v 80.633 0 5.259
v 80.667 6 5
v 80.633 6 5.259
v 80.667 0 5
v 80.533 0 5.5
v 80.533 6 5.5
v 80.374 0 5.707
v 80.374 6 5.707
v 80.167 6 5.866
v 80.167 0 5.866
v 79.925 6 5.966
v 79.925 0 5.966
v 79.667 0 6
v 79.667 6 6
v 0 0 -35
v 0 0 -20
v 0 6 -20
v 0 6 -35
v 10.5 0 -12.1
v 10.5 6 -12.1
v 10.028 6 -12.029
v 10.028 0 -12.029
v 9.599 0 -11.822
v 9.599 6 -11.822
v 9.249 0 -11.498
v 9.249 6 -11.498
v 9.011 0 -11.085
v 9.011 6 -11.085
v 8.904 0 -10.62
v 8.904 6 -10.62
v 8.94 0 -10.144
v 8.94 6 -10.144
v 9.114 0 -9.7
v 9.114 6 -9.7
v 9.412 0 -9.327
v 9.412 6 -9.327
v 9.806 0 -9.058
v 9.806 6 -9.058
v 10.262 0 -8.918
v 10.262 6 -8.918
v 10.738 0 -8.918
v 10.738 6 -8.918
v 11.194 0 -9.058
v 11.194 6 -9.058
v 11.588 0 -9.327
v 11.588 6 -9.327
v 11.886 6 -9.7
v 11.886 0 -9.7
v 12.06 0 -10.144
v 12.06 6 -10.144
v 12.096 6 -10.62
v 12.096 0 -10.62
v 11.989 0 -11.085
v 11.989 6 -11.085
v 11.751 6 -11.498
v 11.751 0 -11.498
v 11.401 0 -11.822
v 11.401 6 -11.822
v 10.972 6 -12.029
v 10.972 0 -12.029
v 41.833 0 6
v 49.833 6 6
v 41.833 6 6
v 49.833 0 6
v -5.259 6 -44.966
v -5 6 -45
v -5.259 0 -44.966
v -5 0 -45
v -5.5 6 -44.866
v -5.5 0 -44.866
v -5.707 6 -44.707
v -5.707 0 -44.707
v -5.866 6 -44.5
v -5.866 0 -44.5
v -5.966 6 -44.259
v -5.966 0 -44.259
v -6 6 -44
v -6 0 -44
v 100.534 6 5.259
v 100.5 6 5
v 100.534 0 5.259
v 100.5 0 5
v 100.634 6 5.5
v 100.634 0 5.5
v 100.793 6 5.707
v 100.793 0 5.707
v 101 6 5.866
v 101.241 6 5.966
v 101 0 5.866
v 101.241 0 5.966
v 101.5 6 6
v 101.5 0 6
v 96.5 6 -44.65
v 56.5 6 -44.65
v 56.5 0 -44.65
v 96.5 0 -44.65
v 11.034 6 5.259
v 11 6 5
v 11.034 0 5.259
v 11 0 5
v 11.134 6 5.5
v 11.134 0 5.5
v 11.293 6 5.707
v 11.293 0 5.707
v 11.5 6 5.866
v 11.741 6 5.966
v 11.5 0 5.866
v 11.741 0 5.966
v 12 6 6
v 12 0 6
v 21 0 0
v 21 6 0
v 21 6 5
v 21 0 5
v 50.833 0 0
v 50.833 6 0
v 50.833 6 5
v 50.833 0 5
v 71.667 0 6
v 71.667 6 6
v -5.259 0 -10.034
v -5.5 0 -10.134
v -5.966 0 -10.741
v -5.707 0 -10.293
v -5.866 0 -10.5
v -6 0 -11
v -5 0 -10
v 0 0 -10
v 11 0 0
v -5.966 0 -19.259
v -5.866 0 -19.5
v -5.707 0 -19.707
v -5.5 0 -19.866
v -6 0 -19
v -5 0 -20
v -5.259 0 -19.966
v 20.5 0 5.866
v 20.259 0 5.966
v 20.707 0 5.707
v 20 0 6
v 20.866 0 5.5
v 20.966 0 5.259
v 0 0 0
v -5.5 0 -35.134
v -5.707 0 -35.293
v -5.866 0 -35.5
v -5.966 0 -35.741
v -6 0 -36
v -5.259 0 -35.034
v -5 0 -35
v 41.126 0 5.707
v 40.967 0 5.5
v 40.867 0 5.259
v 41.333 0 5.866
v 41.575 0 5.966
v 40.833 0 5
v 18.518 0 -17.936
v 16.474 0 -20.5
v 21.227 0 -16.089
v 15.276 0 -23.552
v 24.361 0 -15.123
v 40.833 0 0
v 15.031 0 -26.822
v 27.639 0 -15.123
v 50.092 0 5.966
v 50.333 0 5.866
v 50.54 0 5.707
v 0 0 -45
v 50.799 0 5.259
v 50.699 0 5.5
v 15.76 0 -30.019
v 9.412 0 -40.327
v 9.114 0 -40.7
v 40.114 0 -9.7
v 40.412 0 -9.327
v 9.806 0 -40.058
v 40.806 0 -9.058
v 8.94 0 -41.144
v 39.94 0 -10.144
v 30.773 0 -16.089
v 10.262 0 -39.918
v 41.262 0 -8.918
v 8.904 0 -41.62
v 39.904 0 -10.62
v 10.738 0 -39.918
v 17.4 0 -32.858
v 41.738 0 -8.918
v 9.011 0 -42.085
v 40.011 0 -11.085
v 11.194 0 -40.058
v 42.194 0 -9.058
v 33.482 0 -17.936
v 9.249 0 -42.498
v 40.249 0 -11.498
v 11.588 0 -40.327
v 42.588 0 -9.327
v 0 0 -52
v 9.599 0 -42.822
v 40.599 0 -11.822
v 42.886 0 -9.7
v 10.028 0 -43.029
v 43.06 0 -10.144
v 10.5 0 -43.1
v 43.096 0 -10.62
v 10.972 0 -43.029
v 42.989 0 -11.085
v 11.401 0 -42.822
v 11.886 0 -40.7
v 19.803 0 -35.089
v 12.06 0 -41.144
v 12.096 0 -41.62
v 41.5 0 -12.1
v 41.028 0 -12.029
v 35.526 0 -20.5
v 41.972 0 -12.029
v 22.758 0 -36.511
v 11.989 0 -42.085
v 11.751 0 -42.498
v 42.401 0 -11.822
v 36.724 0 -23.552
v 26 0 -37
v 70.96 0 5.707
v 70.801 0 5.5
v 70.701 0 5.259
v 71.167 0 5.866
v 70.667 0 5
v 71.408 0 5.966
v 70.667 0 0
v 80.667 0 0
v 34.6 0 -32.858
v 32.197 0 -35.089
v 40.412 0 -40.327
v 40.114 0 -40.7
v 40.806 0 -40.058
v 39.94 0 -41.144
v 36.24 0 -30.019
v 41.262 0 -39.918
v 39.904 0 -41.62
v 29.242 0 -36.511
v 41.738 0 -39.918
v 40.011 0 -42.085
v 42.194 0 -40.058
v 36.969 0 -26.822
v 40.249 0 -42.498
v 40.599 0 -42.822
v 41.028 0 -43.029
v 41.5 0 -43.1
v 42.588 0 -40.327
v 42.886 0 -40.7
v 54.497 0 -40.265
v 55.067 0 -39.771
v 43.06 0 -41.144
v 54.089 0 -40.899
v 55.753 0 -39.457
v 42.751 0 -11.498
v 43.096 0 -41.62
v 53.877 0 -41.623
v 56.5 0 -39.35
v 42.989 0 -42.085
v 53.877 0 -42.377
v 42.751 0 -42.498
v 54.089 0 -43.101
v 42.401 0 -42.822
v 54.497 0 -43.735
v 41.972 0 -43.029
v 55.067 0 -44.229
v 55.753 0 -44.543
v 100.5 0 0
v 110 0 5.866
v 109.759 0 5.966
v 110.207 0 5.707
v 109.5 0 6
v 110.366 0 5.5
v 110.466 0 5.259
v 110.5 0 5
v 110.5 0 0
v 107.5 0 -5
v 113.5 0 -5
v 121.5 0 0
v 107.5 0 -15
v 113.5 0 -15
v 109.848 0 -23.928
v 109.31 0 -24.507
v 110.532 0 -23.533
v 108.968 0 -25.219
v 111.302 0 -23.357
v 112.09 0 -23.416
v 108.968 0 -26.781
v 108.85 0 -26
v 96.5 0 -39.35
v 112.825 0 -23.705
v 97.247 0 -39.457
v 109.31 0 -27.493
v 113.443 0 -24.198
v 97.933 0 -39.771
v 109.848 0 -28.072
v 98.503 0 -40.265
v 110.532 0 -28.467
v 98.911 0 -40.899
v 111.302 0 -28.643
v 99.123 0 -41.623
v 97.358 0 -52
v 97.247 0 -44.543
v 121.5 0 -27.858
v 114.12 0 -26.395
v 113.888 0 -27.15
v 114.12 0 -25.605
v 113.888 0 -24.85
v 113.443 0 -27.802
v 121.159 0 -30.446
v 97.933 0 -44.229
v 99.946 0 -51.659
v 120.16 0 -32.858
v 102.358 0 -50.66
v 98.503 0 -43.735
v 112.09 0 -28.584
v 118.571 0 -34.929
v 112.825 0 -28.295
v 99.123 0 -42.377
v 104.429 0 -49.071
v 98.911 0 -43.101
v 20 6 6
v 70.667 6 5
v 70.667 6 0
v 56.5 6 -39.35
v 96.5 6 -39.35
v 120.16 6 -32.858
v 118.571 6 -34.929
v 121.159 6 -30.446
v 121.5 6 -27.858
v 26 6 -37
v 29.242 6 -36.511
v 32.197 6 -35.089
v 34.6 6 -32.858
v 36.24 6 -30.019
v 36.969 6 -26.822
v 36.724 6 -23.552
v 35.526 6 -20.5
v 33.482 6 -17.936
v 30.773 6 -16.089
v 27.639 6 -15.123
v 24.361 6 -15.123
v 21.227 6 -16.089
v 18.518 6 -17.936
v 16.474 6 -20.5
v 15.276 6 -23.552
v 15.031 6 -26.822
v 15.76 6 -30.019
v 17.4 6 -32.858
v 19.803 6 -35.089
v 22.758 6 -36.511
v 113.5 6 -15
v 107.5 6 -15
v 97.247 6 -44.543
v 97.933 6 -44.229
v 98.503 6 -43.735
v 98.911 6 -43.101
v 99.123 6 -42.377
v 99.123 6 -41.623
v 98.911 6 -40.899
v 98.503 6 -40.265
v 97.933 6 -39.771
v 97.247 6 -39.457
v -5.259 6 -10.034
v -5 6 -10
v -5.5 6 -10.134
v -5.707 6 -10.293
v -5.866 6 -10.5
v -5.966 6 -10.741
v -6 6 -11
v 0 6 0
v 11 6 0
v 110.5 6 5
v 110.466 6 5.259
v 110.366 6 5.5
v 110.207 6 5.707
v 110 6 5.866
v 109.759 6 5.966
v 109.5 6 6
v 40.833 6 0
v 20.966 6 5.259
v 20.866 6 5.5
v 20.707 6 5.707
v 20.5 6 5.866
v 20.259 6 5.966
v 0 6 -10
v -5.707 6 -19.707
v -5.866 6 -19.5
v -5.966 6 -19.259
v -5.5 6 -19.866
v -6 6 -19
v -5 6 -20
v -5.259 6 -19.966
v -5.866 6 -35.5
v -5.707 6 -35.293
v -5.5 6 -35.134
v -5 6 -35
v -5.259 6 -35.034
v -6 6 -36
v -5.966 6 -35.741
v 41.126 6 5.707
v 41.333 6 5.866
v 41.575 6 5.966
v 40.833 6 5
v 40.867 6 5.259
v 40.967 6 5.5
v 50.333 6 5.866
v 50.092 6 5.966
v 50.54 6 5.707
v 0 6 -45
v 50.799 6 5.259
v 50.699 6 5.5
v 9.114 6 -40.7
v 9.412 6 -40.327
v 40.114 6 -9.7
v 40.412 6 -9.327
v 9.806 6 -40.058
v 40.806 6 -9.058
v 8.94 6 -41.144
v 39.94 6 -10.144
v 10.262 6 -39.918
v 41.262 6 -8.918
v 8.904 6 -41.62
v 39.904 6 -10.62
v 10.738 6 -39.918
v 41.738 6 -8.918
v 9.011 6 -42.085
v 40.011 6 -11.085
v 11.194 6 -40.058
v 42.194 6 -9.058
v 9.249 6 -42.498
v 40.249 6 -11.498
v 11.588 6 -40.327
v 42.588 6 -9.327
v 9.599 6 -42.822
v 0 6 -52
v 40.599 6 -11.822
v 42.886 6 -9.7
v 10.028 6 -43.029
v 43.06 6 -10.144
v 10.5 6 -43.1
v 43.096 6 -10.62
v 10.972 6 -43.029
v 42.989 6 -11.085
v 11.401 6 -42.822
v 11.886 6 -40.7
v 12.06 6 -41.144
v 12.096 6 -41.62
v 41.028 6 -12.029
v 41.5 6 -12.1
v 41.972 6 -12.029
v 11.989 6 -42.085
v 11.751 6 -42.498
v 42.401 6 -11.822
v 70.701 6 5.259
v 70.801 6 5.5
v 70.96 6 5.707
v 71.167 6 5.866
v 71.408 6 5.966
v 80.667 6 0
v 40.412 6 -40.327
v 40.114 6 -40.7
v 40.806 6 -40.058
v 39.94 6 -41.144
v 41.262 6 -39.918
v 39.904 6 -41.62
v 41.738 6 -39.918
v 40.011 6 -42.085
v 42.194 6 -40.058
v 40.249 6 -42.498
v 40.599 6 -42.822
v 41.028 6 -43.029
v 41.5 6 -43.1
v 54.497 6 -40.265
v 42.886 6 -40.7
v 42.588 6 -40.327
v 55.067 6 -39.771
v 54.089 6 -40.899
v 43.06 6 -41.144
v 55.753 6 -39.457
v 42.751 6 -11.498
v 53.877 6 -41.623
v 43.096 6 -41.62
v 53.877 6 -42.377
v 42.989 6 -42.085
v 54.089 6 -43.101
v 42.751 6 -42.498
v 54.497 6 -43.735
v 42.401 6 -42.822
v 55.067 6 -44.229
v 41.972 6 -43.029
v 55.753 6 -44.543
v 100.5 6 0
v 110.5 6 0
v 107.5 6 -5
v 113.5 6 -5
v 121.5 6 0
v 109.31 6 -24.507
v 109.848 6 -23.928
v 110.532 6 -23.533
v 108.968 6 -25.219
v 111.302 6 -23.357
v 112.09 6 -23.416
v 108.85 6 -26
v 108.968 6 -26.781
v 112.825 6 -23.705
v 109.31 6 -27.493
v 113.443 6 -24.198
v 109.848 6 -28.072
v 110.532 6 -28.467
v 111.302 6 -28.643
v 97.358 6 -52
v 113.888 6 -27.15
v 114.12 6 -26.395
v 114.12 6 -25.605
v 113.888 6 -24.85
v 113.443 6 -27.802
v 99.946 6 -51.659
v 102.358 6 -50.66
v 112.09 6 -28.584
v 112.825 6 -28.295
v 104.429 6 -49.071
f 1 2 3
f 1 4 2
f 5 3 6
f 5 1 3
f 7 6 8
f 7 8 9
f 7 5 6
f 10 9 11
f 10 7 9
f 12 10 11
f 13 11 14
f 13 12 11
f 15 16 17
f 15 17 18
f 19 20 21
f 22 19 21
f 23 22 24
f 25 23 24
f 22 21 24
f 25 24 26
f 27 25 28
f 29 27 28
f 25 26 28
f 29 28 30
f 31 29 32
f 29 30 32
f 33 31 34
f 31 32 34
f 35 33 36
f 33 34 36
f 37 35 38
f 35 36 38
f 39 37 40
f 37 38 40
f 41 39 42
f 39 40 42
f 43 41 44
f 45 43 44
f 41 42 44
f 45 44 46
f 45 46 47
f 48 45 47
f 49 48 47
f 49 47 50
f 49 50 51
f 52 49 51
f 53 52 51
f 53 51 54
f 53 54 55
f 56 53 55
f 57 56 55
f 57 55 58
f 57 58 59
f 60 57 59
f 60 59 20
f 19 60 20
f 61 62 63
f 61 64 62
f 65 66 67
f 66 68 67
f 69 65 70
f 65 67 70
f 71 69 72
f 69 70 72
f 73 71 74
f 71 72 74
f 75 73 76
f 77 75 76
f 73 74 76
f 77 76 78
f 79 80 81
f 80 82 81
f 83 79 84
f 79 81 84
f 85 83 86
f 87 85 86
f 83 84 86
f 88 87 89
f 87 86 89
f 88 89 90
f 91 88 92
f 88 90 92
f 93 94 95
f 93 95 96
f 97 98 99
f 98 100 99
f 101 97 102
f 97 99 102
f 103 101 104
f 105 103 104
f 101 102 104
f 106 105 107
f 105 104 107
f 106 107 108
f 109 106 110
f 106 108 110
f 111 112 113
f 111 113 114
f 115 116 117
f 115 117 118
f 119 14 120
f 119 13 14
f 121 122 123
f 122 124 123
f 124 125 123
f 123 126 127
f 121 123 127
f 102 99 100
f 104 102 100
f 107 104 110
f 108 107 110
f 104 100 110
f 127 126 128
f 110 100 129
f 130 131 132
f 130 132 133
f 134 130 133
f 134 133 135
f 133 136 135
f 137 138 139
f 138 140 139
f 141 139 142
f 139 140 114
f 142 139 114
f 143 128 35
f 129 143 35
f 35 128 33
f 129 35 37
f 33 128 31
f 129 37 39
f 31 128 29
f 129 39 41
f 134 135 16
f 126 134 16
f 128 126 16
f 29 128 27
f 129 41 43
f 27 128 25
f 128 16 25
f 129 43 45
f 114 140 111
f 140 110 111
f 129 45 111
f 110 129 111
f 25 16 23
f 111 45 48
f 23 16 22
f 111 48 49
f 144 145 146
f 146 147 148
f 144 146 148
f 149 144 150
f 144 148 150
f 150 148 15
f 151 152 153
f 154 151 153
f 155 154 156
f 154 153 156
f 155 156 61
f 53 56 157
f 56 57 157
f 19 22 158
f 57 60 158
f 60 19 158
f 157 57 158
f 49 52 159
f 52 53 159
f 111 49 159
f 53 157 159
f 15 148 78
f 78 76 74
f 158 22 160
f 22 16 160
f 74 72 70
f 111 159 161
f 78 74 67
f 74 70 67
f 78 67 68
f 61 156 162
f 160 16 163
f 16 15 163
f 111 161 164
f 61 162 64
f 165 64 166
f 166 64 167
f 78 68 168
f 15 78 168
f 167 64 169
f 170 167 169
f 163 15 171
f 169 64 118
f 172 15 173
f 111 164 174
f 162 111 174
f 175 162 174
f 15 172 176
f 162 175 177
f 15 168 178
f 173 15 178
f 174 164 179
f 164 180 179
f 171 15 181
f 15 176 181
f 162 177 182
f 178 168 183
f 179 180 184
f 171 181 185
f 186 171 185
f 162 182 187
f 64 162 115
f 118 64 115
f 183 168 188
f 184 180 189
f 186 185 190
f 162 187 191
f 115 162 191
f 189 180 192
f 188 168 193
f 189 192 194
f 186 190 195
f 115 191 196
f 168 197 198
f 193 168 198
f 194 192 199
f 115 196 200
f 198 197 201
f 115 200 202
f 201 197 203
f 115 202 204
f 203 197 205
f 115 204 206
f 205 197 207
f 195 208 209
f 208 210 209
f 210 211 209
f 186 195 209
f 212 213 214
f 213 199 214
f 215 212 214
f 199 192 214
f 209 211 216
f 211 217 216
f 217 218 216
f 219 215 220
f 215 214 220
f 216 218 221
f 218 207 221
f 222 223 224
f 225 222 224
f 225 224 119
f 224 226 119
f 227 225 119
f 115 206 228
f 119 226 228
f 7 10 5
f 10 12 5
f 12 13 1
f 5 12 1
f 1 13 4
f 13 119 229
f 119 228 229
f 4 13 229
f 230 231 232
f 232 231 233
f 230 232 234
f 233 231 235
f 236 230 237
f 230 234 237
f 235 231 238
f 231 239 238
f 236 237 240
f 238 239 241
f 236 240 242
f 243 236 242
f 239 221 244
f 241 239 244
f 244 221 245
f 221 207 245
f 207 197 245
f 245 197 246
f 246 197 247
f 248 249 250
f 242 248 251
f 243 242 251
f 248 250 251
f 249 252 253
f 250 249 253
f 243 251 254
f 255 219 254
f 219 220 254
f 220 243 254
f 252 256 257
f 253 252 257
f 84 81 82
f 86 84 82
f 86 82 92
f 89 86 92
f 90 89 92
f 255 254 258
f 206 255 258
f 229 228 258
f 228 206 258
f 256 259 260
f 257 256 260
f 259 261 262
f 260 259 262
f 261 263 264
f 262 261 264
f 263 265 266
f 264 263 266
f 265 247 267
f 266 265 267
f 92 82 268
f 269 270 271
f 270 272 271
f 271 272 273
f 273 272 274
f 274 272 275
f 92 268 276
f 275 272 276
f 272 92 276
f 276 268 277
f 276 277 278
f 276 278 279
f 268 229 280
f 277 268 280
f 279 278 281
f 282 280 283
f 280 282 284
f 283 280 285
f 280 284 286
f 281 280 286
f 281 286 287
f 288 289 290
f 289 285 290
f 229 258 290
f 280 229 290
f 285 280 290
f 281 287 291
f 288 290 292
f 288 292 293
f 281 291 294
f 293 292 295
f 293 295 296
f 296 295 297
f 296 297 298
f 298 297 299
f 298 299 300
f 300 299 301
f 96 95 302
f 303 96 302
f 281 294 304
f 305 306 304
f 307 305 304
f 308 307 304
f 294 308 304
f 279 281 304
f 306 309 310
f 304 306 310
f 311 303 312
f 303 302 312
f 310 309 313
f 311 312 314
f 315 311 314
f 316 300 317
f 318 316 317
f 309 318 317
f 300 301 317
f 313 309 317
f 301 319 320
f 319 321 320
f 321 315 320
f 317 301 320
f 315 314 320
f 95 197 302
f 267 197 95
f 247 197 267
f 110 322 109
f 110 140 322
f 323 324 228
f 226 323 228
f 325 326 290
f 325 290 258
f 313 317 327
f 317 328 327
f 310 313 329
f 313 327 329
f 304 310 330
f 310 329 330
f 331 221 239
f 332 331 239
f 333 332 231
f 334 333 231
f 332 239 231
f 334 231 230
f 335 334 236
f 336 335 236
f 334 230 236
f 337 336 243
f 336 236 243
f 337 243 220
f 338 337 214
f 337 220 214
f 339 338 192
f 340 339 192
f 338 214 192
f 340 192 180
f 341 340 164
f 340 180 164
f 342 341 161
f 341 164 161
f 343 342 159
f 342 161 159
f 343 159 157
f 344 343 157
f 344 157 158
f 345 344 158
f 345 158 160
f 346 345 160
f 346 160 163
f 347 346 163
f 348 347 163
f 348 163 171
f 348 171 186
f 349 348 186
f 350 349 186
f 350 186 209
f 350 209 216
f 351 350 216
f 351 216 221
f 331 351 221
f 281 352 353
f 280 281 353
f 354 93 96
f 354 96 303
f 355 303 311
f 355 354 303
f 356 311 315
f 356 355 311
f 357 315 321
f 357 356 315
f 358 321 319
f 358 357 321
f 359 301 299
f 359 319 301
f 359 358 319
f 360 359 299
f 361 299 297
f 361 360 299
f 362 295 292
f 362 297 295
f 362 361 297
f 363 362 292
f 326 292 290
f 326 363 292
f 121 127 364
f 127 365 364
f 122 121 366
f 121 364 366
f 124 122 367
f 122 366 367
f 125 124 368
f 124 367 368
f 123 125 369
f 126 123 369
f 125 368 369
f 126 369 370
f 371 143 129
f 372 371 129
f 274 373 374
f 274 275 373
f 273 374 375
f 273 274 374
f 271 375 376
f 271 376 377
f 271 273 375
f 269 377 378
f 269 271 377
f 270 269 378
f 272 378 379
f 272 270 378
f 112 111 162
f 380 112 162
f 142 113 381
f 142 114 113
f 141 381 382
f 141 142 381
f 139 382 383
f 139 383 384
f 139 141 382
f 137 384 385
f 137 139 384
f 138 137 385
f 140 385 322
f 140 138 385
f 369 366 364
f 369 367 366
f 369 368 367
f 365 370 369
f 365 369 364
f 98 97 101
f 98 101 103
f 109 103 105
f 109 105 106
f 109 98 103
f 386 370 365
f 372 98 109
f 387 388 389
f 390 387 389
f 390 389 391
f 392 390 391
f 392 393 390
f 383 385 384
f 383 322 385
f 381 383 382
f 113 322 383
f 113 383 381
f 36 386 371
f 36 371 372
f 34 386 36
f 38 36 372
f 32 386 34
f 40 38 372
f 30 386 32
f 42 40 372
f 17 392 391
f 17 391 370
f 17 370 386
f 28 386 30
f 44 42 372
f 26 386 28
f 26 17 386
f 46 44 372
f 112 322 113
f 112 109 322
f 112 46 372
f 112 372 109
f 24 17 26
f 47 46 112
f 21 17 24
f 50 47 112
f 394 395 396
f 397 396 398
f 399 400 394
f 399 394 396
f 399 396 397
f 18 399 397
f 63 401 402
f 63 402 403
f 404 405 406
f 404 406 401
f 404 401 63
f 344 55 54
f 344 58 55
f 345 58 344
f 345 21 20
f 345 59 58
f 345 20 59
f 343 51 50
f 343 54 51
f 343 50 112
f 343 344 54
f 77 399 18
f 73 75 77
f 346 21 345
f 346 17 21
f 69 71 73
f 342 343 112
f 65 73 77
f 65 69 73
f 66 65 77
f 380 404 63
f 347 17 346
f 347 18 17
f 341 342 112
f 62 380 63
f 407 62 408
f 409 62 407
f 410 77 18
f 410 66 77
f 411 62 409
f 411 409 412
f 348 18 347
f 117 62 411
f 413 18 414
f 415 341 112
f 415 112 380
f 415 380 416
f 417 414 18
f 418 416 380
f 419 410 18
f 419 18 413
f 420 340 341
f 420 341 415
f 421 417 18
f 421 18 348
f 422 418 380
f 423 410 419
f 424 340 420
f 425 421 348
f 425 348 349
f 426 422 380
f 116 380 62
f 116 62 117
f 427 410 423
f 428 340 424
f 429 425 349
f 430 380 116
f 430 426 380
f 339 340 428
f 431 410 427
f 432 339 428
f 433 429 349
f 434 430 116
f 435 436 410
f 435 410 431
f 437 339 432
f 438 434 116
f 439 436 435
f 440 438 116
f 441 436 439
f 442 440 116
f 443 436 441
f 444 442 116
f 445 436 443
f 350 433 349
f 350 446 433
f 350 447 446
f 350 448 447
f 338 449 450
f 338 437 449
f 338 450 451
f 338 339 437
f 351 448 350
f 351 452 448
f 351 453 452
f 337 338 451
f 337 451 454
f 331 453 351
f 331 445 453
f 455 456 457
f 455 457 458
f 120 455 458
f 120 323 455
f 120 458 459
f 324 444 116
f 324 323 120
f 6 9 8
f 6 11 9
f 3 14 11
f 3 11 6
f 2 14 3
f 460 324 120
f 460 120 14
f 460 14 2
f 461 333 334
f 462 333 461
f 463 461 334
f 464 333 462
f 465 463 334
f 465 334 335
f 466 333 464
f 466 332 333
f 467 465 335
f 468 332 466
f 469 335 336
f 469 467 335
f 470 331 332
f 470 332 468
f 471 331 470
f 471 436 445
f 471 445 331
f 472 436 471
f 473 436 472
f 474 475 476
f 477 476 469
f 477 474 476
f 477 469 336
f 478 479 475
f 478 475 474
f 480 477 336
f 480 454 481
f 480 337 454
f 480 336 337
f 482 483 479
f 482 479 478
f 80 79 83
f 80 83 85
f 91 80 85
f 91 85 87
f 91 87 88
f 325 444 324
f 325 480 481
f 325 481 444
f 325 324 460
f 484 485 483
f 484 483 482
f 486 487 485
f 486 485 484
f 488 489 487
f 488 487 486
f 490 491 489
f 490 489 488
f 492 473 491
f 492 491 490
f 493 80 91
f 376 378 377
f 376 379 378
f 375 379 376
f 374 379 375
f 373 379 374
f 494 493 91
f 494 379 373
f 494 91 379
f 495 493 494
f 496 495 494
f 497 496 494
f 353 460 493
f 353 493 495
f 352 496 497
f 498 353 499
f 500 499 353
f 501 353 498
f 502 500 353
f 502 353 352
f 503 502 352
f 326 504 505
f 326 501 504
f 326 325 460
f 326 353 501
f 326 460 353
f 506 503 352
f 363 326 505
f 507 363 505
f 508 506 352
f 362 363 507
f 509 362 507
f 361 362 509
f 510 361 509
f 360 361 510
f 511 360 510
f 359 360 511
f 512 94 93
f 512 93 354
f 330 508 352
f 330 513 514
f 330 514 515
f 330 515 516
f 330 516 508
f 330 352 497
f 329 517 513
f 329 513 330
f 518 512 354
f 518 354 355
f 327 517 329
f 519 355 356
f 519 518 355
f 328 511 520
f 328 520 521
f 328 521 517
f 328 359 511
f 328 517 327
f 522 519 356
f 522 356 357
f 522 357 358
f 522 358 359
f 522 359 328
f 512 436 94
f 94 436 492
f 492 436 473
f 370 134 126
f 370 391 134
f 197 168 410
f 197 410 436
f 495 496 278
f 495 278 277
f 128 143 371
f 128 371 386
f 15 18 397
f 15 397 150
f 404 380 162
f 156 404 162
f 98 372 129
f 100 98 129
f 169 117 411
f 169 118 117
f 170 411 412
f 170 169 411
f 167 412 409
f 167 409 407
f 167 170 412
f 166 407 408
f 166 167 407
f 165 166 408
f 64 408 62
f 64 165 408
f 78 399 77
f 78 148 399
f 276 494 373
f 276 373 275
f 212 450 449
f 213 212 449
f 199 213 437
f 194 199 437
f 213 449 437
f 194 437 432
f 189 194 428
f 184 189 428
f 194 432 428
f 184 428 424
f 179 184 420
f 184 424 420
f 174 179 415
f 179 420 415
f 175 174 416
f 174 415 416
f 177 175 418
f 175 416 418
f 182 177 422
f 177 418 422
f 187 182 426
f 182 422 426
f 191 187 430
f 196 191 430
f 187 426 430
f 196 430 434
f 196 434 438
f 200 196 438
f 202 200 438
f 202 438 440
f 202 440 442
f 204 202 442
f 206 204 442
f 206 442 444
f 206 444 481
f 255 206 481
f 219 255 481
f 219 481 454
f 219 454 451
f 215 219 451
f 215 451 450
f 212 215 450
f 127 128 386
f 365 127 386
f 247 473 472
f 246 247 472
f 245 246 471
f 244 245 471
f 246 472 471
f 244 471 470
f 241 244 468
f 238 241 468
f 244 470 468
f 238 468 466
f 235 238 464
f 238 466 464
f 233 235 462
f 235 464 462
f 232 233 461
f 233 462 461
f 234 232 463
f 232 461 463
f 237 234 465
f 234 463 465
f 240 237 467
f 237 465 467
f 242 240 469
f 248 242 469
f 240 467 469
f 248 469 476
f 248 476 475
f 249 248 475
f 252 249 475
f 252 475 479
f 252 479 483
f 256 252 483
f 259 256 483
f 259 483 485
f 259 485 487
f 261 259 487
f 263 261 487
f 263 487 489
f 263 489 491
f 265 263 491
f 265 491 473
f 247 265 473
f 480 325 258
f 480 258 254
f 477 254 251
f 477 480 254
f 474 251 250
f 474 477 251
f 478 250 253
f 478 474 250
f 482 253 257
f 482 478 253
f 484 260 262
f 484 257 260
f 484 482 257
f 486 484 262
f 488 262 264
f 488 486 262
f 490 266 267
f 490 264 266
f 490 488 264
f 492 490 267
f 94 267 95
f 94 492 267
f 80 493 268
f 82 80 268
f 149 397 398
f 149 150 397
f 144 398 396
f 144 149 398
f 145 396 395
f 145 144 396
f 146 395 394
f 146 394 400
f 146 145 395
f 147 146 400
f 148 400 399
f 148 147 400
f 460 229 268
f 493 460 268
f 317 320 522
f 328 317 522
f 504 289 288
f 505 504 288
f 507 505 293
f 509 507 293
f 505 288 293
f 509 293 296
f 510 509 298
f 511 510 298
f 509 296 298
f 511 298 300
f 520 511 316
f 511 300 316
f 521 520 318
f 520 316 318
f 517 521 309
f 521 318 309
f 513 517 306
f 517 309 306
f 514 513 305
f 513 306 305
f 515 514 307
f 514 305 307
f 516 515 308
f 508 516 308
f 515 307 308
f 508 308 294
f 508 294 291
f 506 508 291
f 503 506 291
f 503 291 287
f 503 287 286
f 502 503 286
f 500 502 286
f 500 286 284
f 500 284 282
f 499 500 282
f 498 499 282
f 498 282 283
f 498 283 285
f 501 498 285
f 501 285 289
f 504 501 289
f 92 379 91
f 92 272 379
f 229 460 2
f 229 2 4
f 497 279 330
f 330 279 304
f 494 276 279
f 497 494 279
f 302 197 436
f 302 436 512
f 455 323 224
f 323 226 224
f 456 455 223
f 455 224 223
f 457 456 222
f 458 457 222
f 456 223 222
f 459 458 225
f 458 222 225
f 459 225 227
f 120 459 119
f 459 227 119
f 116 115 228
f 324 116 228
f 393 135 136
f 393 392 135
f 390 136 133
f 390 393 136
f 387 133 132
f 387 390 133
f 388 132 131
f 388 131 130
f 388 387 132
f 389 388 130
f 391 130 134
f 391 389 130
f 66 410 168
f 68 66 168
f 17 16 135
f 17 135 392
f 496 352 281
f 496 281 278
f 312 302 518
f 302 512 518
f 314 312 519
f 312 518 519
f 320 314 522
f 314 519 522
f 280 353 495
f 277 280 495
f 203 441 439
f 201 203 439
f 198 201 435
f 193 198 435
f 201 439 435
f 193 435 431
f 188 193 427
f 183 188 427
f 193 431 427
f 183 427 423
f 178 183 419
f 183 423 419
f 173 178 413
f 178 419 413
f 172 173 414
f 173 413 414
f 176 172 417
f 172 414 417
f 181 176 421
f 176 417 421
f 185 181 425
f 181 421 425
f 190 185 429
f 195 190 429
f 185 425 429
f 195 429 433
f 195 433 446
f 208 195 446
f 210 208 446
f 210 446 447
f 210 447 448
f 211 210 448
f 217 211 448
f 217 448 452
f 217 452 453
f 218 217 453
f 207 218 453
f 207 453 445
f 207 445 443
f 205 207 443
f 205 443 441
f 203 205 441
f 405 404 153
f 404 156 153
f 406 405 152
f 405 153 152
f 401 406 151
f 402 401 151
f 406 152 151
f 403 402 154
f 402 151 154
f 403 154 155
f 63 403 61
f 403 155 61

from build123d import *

# Parameters (mm, degrees)
SKETCH1_W               = 121.5
SKETCH1_H               = 52
BOSS_EXTRUDE1_DEPTH     = 6
CHAMFER1_SIZE           = 20
M5_CLEARANCE_HOLE1_D    = 5.3
CUT_EXTRUDE4_DEPTH      = 7
M3_CLEARANCE_HOLE1_D    = 3.2
SKETCH6_R               = 11
CUT_EXTRUDE3_DEPTH      = 7
SKETCH234_W             = 10
SKETCH234_H             = 6
BOSS_EXTRUDE234_DEPTH   = 6
FILLET134_R             = 1
SKETCH2341_W            = 10
SKETCH2341_H            = 6
BOSS_EXTRUDE2341_DEPTH  = 6
FILLET1341_R            = 1
SKETCH2342_W            = 10
SKETCH2342_H            = 6
BOSS_EXTRUDE2342_DEPTH  = 6
FILLET1342_R            = 1
SKETCH2343_W            = 10
SKETCH2343_H            = 6
BOSS_EXTRUDE2343_DEPTH  = 6
FILLET1343_R            = 1
SKETCH2345_W            = 10
SKETCH2345_H            = 6
BOSS_EXTRUDE2345_DEPTH  = 6
FILLET1345_R            = 1
SKETCH2346_W            = 10
SKETCH2346_H            = 6
BOSS_EXTRUDE2346_DEPTH  = 6
FILLET1346_R            = 1
FILLET1347_R            = 10
SKETCH62_W              = 10
SKETCH62_H              = 6
CUT_EXTRUDE1_DEPTH      = 4
CUT_EXTRUDE1_DEPTH_BACK = 4


with BuildPart() as part:
    # Sketch1 → Boss-Extrude1 (new body)
    with BuildSketch(Plane(origin=(0, 0, 0), x_dir=(1, 0, 0), z_dir=(0, 1, 0))):
        with Locations((60.75, 26)):
            Rectangle(SKETCH1_W, SKETCH1_H)
    extrude(amount=BOSS_EXTRUDE1_DEPTH)

    # Chamfer1
    chamfer1_edges = [part.edges().sort_by_distance(p)[0] for p in [
        (121.5, 3, -52),
    ]]
    chamfer(chamfer1_edges, length=CHAMFER1_SIZE)

    # M5 Clearance Hole1 (through all)
    with Locations(Plane(origin=(0, 6, 0), x_dir=(1, 0, 0), z_dir=(0, 1, 0))):
        with Locations((111.5, 26)):
            Hole(M5_CLEARANCE_HOLE1_D / 2)

    # Sketch7 → Cut-Extrude4 (cut, through all)
    with BuildSketch(Plane(origin=(0, 6, 0), x_dir=(1, 0, 0), z_dir=(0, 1, 0))):
        with BuildLine():
            Line((56.5, 44.65), (96.5, 44.65))
            ThreePointArc((96.5, 44.65), (99.15, 42), (96.5, 39.35))
            Line((96.5, 39.35), (56.5, 39.35))
            ThreePointArc((56.5, 39.35), (53.85, 42), (56.5, 44.65))
        make_face()
    extrude(amount=-CUT_EXTRUDE4_DEPTH, mode=Mode.SUBTRACT)

    # M3 Clearance Hole1 (through all)
    with Locations(Plane(origin=(26, 0, -26), x_dir=(0, 0, 1), z_dir=(0, -1, 0))):
        with Locations((15.5, -15.5), (-15.5, -15.5), (-15.5, 15.5), (15.5, 15.5)):
            Hole(M3_CLEARANCE_HOLE1_D / 2)

    # Sketch6 → Cut-Extrude3 (cut, through all)
    with BuildSketch(Plane(origin=(26, 0, -26), x_dir=(0, 0, -1), z_dir=(0, -1, 0))):
        Circle(SKETCH6_R)
    extrude(amount=-CUT_EXTRUDE3_DEPTH, mode=Mode.SUBTRACT)

    # Sketch234 → Boss-Extrude234 (add)
    with BuildSketch(Plane(origin=(16.767778608, 6, 0), x_dir=(-1, 0, 0), z_dir=(0, 0, 1))):
        with Locations((0.767778608, 3)):
            Rectangle(SKETCH234_W, SKETCH234_H)
    extrude(amount=BOSS_EXTRUDE234_DEPTH)

    # Fillet134
    fillet134_edges = [part.edges().sort_by_distance(p)[0] for p in [
        (21, 3, 6),
        (11, 3, 6),
    ]]
    fillet(fillet134_edges, radius=FILLET134_R)

    # Sketch2341 → Boss-Extrude2341 (add)
    with BuildSketch(Plane(origin=(46.601111941, 6, 0), x_dir=(-1, 0, 0), z_dir=(0, 0, 1))):
        with Locations((0.767778608, 3)):
            Rectangle(SKETCH2341_W, SKETCH2341_H)
    extrude(amount=BOSS_EXTRUDE2341_DEPTH)

    # Fillet1341
    fillet1341_edges = [part.edges().sort_by_distance(p)[0] for p in [
        (40.833333333, 3, 6),
        (50.833333333, 3, 6),
    ]]
    fillet(fillet1341_edges, radius=FILLET1341_R)

    # Sketch2342 → Boss-Extrude2342 (add)
    with BuildSketch(Plane(origin=(76.434445274, 6, 0), x_dir=(-1, 0, 0), z_dir=(0, 0, 1))):
        with Locations((0.767778608, 3)):
            Rectangle(SKETCH2342_W, SKETCH2342_H)
    extrude(amount=BOSS_EXTRUDE2342_DEPTH)

    # Fillet1342
    fillet1342_edges = [part.edges().sort_by_distance(p)[0] for p in [
        (70.666666667, 3, 6),
        (80.666666667, 3, 6),
    ]]
    fillet(fillet1342_edges, radius=FILLET1342_R)

    # Sketch2343 → Boss-Extrude2343 (add)
    with BuildSketch(Plane(origin=(106.267778608, 6, 0), x_dir=(-1, 0, 0), z_dir=(0, 0, 1))):
        with Locations((0.767778608, 3)):
            Rectangle(SKETCH2343_W, SKETCH2343_H)
    extrude(amount=BOSS_EXTRUDE2343_DEPTH)

    # Fillet1343
    fillet1343_edges = [part.edges().sort_by_distance(p)[0] for p in [
        (100.5, 3, 6),
        (110.5, 3, 6),
    ]]
    fillet(fillet1343_edges, radius=FILLET1343_R)

    # Sketch2345 → Boss-Extrude2345 (add)
    with BuildSketch(Plane(origin=(0, 0, -15.767778608), x_dir=(0, 0, 1), z_dir=(-1, 0, 0))):
        with Locations((0.767778608, 3)):
            Rectangle(SKETCH2345_W, SKETCH2345_H)
    extrude(amount=BOSS_EXTRUDE2345_DEPTH)

    # Fillet1345
    fillet1345_edges = [part.edges().sort_by_distance(p)[0] for p in [
        (-6, 3, -20),
        (-6, 3, -10),
    ]]
    fillet(fillet1345_edges, radius=FILLET1345_R)

    # Sketch2346 → Boss-Extrude2346 (add)
    with BuildSketch(Plane(origin=(0, 6, -39.232221392), x_dir=(0, 0, -1), z_dir=(-1, 0, 0))):
        with Locations((0.767778608, 3)):
            Rectangle(SKETCH2346_W, SKETCH2346_H)
    extrude(amount=BOSS_EXTRUDE2346_DEPTH)

    # Fillet1346
    fillet1346_edges = [part.edges().sort_by_distance(p)[0] for p in [
        (-6, 3, -45),
        (-6, 3, -35),
    ]]
    fillet(fillet1346_edges, radius=FILLET1346_R)

    # Fillet1347
    fillet1347_edges = [part.edges().sort_by_distance(p)[0] for p in [
        (101.5, 3, -52),
        (121.5, 3, -32),
    ]]
    fillet(fillet1347_edges, radius=FILLET1347_R)

    # Sketch62 → Cut-Extrude1 (cut, two sides)
    with BuildSketch(Plane(origin=(66.5, 3, -10.767778608), x_dir=(0, 0, 1), z_dir=(0, -1, 0))) as cut_extrude1_sk:
        with Locations((0.767778608, -44)):
            Rectangle(SKETCH62_W, SKETCH62_H)
    extrude(amount=CUT_EXTRUDE1_DEPTH, mode=Mode.SUBTRACT)
    extrude(cut_extrude1_sk.sketch, amount=-CUT_EXTRUDE1_DEPTH_BACK, mode=Mode.SUBTRACT)


solid = part.part
